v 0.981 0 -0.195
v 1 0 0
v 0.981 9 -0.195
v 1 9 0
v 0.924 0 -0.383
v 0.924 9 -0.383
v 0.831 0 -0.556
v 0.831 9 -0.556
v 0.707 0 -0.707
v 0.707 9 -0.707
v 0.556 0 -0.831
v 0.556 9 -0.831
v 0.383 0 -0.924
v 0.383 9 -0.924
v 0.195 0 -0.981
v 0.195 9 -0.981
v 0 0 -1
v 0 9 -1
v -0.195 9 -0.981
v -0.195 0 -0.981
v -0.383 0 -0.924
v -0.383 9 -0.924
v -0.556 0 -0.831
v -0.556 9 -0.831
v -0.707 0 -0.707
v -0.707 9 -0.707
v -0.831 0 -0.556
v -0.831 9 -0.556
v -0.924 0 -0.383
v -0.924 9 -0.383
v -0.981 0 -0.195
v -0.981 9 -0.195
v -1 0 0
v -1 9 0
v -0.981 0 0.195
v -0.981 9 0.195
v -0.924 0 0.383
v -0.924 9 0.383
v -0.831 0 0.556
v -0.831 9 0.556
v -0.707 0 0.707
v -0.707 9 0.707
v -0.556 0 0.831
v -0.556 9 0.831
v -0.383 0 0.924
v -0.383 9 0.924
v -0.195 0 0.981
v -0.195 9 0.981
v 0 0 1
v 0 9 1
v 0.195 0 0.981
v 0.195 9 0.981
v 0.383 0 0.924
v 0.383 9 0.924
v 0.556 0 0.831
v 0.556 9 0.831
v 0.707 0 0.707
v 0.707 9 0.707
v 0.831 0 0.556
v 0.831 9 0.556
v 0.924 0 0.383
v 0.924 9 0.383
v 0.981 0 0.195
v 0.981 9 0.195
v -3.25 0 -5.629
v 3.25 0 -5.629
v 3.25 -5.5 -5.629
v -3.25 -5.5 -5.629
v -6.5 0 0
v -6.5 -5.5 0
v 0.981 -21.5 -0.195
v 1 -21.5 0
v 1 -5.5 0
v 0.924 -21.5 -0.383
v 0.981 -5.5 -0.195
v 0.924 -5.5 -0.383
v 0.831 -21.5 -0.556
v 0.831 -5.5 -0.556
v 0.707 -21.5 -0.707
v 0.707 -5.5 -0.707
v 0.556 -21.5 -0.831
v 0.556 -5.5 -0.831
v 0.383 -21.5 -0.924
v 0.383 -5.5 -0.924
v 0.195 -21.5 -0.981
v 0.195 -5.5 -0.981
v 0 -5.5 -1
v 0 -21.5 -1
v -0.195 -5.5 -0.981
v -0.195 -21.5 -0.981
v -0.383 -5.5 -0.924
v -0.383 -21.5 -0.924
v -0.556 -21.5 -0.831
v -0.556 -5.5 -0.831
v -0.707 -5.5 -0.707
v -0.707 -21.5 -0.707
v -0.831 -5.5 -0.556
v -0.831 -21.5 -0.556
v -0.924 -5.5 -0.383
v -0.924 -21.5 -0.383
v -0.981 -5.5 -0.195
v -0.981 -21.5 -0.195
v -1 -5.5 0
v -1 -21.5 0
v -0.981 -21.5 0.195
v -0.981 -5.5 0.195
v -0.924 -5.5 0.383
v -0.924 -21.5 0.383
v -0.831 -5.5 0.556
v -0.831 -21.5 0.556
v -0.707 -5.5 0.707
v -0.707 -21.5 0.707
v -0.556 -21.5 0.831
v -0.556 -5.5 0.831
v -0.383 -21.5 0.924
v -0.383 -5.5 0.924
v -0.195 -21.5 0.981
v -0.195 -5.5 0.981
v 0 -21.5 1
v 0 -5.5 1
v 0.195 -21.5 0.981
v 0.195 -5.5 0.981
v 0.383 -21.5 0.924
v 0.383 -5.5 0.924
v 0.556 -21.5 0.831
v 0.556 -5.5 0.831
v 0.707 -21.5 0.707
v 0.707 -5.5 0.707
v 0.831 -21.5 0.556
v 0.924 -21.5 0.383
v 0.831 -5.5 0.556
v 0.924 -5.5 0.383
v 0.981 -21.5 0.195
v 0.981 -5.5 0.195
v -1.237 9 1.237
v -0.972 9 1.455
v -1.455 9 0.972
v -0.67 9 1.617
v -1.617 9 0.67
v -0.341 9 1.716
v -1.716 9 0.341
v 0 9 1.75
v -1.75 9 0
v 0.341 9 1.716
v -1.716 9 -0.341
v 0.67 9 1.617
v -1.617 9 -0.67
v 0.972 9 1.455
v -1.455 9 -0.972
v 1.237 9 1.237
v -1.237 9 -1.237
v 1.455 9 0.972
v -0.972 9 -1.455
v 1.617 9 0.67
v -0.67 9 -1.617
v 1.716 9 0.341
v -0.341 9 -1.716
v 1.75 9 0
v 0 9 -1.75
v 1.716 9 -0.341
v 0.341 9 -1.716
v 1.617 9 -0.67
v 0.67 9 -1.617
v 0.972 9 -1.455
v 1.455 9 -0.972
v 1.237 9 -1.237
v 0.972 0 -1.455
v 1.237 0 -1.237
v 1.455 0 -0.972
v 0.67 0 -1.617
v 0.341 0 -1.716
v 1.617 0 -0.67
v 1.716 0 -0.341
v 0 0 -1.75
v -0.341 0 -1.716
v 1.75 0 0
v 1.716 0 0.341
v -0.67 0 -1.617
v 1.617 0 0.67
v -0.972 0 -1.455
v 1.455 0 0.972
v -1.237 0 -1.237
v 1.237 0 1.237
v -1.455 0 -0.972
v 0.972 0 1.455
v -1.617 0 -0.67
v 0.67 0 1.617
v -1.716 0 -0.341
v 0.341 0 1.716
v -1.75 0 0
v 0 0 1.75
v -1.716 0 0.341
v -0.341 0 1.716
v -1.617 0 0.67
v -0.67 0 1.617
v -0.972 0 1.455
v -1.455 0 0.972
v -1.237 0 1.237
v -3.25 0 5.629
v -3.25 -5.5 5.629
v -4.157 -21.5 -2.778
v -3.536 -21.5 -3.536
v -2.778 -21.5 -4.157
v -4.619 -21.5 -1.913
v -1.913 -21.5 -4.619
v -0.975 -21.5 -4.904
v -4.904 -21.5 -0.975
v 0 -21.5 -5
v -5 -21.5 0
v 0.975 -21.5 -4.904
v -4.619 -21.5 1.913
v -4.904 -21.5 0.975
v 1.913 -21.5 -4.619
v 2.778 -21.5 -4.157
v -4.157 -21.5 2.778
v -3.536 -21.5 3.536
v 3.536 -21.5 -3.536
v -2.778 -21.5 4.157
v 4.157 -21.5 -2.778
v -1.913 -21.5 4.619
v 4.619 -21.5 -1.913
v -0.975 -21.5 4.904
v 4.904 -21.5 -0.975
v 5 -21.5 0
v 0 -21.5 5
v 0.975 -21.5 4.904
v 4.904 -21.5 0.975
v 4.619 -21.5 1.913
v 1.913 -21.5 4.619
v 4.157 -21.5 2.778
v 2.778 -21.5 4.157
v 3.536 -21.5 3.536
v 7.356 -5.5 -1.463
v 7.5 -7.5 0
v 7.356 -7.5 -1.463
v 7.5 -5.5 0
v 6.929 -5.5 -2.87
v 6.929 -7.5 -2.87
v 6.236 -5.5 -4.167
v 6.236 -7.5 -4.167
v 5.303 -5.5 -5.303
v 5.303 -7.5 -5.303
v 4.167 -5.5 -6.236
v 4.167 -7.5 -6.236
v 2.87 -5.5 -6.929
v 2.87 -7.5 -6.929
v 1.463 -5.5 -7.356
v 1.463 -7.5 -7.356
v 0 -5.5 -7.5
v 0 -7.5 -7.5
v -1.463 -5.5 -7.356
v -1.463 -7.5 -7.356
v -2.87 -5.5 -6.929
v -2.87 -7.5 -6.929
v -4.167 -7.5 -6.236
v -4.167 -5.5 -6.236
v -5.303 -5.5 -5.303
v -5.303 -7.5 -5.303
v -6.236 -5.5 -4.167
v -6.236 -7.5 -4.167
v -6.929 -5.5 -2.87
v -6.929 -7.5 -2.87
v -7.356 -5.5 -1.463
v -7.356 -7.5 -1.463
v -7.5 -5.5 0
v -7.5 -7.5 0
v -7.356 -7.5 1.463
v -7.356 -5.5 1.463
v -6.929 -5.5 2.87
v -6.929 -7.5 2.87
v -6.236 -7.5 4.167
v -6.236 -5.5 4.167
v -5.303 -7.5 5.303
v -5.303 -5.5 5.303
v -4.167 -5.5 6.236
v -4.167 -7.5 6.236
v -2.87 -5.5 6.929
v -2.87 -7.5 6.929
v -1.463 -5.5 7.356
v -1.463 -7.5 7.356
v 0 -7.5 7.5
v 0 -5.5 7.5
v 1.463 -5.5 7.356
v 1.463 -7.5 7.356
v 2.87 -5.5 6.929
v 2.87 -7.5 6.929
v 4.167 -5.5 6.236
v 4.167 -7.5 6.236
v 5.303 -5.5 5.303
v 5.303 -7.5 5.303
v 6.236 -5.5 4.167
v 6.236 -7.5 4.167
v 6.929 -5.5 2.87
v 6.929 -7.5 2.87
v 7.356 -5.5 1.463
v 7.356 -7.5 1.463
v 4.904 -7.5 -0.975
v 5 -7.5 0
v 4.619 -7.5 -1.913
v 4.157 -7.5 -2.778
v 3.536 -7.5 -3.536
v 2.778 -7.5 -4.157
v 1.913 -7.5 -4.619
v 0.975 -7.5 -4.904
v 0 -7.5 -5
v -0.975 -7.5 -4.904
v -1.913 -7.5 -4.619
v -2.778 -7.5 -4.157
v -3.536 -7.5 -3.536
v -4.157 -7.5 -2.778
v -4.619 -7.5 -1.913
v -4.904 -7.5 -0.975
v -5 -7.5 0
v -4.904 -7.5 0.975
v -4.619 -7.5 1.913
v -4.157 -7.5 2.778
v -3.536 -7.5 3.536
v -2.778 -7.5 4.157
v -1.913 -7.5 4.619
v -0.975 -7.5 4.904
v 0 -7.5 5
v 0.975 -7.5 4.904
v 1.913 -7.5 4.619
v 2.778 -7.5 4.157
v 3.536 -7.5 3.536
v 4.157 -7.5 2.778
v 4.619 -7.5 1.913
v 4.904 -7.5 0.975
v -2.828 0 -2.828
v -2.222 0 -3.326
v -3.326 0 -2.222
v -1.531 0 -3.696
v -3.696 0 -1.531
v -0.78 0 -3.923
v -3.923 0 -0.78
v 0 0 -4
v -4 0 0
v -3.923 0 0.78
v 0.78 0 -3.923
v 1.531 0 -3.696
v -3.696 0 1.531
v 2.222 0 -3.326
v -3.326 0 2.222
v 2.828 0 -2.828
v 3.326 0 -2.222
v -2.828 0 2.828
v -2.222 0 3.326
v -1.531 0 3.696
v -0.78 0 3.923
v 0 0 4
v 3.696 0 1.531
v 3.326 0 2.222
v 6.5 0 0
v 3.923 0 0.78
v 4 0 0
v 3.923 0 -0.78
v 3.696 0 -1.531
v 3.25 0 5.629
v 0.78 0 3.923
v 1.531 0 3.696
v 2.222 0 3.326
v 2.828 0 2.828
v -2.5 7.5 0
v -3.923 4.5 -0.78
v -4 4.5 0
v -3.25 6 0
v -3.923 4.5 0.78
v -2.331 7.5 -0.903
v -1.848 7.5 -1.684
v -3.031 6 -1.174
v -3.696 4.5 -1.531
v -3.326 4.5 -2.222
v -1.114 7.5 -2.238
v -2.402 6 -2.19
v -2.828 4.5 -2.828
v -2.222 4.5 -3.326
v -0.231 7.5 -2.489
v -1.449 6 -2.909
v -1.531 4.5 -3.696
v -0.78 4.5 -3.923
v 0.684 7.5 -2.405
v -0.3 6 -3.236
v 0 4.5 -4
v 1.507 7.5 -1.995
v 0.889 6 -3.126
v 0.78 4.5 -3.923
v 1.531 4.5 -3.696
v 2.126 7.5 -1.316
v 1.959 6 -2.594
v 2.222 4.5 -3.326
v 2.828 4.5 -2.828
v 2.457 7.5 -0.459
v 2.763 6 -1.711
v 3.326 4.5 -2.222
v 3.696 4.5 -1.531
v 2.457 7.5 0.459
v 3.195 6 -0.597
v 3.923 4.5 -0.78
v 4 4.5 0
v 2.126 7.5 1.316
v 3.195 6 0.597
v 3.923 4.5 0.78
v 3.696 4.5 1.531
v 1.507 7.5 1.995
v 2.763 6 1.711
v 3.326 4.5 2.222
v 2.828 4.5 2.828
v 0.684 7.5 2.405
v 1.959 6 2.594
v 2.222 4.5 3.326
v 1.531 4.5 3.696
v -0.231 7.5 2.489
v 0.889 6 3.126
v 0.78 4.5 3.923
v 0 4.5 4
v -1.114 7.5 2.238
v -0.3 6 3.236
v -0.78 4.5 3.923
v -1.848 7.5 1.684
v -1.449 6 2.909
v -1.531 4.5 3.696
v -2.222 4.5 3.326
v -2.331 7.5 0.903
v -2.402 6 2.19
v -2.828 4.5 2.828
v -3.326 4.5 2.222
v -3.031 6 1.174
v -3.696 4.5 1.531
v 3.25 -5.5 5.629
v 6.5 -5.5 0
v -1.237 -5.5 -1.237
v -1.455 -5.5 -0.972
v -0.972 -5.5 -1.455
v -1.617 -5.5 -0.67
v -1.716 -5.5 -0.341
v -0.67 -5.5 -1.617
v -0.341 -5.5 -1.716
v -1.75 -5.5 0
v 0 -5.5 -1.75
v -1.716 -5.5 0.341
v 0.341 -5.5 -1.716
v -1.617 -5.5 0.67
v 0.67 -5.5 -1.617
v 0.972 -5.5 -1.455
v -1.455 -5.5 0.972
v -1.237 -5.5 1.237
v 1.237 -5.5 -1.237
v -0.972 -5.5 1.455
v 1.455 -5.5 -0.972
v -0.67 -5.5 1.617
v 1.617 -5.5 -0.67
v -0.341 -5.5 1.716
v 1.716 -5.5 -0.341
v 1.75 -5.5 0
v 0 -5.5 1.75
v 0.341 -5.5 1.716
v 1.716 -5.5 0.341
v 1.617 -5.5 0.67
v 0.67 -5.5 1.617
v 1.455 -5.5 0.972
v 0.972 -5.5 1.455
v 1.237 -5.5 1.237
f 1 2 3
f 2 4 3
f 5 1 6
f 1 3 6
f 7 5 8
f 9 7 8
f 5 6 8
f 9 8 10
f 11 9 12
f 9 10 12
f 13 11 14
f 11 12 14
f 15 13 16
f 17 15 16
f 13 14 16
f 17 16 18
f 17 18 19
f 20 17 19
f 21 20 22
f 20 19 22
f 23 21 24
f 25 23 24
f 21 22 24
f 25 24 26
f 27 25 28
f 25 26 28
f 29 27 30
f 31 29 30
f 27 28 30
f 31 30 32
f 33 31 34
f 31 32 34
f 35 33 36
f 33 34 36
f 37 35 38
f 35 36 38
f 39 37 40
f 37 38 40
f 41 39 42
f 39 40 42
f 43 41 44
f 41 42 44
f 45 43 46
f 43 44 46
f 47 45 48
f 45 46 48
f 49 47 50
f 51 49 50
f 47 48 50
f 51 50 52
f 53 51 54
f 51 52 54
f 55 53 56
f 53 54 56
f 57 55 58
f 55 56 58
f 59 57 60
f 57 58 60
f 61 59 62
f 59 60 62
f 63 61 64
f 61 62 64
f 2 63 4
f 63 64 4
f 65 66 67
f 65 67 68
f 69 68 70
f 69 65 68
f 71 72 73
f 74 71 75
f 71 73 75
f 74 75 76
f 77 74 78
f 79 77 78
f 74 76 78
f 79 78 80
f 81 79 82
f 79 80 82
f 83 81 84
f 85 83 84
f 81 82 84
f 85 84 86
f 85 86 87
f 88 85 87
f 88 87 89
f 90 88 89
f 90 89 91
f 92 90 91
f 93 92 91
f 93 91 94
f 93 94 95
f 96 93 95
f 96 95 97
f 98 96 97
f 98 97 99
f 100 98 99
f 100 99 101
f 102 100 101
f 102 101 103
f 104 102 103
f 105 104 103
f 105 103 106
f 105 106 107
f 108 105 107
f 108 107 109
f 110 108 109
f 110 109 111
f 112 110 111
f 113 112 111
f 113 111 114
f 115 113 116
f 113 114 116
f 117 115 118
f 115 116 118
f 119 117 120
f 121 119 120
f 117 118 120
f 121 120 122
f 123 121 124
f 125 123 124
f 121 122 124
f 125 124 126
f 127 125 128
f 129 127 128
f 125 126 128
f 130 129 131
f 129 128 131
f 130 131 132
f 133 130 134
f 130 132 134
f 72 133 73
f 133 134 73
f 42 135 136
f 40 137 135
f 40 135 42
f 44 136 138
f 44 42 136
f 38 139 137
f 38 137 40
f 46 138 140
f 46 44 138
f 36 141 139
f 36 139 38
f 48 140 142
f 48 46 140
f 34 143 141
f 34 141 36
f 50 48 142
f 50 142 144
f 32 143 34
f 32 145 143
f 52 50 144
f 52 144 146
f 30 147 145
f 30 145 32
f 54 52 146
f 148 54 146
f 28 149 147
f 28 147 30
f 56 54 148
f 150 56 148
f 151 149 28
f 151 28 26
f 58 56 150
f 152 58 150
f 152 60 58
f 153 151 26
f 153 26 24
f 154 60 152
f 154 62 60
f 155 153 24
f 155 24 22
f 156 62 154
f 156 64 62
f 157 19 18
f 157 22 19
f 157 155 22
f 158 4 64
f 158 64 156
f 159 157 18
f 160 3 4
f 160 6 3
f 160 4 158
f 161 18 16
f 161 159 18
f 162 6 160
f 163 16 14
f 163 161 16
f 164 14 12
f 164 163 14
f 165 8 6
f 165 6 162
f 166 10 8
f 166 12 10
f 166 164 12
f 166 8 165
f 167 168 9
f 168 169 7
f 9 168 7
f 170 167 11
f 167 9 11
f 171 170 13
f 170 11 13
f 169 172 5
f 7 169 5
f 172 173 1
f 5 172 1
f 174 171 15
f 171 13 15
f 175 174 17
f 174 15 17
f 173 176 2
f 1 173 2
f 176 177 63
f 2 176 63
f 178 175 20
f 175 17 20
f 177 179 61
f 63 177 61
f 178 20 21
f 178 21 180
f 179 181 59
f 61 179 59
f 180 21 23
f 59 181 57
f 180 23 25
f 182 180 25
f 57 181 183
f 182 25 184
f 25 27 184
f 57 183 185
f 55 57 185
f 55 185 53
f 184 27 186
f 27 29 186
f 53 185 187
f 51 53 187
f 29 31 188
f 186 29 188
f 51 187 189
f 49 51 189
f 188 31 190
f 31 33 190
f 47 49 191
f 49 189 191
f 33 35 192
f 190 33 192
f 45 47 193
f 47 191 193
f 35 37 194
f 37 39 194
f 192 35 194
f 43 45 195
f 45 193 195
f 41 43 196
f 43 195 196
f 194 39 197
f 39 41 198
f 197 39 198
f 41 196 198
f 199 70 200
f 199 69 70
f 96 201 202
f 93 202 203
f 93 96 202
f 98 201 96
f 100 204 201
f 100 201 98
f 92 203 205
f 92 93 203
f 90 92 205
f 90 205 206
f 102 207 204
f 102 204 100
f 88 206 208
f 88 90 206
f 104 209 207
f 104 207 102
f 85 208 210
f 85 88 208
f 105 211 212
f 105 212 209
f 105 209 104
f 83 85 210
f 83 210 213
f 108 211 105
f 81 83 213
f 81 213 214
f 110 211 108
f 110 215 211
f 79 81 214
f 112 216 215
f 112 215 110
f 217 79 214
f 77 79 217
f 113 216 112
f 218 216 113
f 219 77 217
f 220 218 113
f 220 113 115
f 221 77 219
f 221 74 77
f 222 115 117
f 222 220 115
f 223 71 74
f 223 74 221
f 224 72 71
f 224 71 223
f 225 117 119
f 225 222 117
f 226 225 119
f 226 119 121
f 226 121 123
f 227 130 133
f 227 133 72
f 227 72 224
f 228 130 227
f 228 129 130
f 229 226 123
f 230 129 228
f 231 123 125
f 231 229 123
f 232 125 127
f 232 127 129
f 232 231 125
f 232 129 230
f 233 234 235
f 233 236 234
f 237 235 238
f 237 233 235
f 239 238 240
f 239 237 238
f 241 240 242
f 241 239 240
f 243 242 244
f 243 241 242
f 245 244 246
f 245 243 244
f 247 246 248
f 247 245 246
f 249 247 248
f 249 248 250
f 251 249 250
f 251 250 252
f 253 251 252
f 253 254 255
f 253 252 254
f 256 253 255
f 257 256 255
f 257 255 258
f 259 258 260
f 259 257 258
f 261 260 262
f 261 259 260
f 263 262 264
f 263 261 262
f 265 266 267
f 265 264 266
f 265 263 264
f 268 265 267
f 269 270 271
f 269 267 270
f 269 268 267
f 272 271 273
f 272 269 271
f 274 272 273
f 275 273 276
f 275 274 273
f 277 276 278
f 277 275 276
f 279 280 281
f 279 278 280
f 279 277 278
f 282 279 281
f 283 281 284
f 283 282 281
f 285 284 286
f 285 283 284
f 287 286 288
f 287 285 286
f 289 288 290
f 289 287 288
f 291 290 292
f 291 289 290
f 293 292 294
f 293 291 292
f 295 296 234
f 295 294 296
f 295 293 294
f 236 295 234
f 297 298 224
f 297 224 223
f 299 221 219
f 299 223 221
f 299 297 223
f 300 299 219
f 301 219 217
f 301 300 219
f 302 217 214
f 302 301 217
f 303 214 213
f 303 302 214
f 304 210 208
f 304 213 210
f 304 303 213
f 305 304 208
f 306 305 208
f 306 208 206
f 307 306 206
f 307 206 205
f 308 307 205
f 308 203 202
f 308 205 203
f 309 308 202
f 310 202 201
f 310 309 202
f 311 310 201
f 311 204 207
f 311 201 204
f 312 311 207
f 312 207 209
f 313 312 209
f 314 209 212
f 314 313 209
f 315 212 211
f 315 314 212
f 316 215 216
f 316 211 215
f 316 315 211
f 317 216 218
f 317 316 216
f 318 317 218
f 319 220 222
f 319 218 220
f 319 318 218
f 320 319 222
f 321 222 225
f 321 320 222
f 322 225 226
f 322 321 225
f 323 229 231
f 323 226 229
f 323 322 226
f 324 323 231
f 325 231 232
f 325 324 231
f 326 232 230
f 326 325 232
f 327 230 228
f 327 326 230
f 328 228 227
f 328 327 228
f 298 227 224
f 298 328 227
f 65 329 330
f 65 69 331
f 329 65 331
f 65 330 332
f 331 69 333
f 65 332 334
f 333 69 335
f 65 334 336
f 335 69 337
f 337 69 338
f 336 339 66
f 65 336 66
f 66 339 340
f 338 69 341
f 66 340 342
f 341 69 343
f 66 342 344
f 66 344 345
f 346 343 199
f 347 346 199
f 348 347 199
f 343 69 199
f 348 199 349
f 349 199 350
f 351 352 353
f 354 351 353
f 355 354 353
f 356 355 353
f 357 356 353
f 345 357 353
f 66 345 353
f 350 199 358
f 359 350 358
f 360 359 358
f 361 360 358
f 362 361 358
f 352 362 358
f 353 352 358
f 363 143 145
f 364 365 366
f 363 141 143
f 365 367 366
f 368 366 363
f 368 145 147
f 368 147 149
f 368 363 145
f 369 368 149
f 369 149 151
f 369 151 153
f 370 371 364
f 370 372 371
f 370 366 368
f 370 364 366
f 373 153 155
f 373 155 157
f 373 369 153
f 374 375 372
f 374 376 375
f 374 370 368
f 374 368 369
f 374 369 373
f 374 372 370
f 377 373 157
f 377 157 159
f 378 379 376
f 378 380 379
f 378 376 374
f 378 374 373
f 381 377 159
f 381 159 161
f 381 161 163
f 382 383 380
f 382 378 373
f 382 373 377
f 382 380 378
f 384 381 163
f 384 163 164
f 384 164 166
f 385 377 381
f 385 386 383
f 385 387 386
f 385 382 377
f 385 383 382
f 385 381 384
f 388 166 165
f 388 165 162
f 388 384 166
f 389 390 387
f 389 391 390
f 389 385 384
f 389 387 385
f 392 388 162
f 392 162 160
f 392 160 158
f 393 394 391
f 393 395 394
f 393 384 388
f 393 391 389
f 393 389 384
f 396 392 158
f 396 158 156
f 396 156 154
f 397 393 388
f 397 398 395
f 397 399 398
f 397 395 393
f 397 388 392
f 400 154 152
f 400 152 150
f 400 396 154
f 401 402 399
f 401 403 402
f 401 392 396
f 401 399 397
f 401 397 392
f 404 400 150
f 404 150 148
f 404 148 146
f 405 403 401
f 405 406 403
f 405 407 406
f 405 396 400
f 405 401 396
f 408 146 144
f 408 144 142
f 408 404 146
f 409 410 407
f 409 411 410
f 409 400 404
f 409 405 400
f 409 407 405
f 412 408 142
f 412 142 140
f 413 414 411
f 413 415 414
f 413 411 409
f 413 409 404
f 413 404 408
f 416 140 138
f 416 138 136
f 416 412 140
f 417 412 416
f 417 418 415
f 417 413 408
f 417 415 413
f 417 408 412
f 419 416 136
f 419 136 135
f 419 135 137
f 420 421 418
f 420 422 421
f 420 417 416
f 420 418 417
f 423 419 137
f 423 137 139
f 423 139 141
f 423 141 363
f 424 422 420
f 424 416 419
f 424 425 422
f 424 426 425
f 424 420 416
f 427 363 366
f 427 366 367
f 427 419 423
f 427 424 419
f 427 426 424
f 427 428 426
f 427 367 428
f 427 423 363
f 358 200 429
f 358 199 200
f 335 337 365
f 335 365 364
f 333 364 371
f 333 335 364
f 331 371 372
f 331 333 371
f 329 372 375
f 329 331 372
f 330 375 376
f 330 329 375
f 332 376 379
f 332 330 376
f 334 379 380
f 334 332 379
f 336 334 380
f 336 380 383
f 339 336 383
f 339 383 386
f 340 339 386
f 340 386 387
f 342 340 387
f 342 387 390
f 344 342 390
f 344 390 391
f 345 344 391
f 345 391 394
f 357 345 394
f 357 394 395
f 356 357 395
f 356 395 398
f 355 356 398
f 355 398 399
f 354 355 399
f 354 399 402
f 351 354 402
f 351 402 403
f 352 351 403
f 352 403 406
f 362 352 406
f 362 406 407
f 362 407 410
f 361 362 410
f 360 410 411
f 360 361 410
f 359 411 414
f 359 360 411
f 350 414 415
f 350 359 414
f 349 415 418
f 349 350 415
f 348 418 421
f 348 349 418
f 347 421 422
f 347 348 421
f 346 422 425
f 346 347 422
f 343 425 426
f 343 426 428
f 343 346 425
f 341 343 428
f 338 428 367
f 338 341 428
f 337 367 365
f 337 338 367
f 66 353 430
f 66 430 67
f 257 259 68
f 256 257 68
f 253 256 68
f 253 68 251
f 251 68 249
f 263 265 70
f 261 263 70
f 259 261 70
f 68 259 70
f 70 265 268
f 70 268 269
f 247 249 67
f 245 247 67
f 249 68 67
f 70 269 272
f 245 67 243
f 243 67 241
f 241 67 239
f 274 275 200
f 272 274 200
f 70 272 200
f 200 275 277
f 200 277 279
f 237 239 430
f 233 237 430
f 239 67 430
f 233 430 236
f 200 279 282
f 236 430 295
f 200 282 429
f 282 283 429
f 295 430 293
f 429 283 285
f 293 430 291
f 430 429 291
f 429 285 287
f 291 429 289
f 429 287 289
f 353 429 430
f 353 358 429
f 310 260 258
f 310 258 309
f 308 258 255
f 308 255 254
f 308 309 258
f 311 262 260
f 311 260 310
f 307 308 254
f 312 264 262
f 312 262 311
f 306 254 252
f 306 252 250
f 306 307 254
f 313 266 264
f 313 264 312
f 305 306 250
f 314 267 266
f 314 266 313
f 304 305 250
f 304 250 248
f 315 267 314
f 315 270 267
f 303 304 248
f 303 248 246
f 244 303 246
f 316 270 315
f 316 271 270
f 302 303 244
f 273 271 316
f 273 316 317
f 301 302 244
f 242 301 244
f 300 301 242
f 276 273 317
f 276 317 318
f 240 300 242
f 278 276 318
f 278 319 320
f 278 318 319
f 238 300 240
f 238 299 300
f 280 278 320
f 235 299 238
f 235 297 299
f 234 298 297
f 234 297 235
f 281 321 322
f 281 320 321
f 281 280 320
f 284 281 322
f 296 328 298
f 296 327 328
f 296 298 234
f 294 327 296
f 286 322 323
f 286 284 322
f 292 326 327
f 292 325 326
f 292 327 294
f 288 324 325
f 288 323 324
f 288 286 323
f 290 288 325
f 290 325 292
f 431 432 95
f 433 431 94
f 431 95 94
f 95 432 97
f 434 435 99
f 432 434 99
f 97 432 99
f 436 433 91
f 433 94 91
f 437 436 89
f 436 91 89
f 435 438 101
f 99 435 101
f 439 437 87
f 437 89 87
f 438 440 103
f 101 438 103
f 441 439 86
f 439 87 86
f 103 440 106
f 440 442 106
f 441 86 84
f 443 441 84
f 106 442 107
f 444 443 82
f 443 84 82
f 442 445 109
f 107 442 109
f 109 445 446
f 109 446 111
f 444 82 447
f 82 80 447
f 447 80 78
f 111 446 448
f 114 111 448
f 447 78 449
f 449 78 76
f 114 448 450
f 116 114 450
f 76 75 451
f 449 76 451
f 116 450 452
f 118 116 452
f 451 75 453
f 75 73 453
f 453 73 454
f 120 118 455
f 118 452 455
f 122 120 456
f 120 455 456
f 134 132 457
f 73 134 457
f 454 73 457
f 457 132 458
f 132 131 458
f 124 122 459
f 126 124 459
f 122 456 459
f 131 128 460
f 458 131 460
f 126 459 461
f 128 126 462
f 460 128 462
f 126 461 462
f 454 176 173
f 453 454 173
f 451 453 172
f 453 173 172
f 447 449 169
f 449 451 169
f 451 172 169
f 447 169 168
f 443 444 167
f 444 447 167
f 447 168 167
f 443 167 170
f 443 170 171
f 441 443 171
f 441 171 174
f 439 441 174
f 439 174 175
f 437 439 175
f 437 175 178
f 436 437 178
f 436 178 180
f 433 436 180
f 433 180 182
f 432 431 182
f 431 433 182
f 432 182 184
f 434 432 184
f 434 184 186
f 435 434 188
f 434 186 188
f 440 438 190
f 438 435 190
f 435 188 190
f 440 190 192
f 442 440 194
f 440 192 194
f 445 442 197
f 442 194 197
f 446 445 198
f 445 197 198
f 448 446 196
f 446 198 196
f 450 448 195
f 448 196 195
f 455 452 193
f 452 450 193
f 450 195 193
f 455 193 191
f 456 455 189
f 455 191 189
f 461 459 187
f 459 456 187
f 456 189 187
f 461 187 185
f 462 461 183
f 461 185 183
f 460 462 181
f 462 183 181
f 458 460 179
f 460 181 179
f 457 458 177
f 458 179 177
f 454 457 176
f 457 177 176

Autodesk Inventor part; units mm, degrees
ref_plane "YZ Plane" through (0, 0, 0) normal (1, 0, 0) x (0, 1, 0)
ref_plane "XZ Plane" through (0, 0, 0) normal (0, 1, 0) x (-1, 0, 0)
sketch "Sketch1" plane through (0, 0, 0) normal (0, 1, 0) x (-1, 0, 0)
  circle A0 centre (0, 0) radius 4
  dimension "d0" = 8
extrude "Extrusion1" add sketch "Sketch1" along normal blind 4.5
ref_plane "Work Plane1" through (0, 9, 0) normal (0, 1, 0) x (1, 0, 0)
sketch "Sketch2" plane through (0, 9, 0) normal (0, 1, 0) x (1, 0, 0)
  circle A0 centre (0, 0) radius 1.75
  dimension "d4" = 3.5
loft "Loft1" add profiles "Sketch2" section 1 edges at (4, 4.5, 0)
sketch "Sketch3" plane through (0, 9, 0) normal (0, 1, 0) x (1, 0, 0)
  circle A0 centre (0, 0) radius 1
  dimension "d9" = 2
sketch "Sketch4" plane through (0, 0, 0) normal (0, -1, 0) x (1, 0, 0)
  circle A0 centre (0, 0) radius 1.75 projected
  line L0 (6.5, 0) -> (3.25, -5.6292)
  line L1 (3.25, -5.6292) -> (-3.25, -5.6292)
  line L2 (-3.25, -5.6292) -> (-6.5, 0)
  line L3 (-6.5, 0) -> (-3.25, 5.6292)
  line L4 (-3.25, 5.6292) -> (3.25, 5.6292)
  line L5 (3.25, 5.6292) -> (6.5, 0)
extrude "Extrusion2" add sketch "Sketch4" along normal blind 5.5
sketch "Sketch5" plane through (0, -5.5, 0) normal (0, -1, 0) x (1, 0, 0)
  circle A0 centre (0, 0) radius 7.5
  dimension "d12" = 15
extrude "Extrusion3" add sketch "Sketch5" along normal blind 2
sketch "Sketch6" plane through (0, -7.5, 0) normal (0, -1, 0) x (1, 0, 0)
  circle A0 centre (0, 0) radius 5
  dimension "d15" = 10
extrude "Extrusion4" add sketch "Sketch6" along normal blind 14
thread "Thread1" size "M10x1.5" class "6g" standard "ANSI Metric M Profile" full length
extrude "Extrusion5" cut sketch "Sketch3" against normal up to surface (30.5 mm away)
properties part number "ZKE-Term-Sprung-17.5mm"
